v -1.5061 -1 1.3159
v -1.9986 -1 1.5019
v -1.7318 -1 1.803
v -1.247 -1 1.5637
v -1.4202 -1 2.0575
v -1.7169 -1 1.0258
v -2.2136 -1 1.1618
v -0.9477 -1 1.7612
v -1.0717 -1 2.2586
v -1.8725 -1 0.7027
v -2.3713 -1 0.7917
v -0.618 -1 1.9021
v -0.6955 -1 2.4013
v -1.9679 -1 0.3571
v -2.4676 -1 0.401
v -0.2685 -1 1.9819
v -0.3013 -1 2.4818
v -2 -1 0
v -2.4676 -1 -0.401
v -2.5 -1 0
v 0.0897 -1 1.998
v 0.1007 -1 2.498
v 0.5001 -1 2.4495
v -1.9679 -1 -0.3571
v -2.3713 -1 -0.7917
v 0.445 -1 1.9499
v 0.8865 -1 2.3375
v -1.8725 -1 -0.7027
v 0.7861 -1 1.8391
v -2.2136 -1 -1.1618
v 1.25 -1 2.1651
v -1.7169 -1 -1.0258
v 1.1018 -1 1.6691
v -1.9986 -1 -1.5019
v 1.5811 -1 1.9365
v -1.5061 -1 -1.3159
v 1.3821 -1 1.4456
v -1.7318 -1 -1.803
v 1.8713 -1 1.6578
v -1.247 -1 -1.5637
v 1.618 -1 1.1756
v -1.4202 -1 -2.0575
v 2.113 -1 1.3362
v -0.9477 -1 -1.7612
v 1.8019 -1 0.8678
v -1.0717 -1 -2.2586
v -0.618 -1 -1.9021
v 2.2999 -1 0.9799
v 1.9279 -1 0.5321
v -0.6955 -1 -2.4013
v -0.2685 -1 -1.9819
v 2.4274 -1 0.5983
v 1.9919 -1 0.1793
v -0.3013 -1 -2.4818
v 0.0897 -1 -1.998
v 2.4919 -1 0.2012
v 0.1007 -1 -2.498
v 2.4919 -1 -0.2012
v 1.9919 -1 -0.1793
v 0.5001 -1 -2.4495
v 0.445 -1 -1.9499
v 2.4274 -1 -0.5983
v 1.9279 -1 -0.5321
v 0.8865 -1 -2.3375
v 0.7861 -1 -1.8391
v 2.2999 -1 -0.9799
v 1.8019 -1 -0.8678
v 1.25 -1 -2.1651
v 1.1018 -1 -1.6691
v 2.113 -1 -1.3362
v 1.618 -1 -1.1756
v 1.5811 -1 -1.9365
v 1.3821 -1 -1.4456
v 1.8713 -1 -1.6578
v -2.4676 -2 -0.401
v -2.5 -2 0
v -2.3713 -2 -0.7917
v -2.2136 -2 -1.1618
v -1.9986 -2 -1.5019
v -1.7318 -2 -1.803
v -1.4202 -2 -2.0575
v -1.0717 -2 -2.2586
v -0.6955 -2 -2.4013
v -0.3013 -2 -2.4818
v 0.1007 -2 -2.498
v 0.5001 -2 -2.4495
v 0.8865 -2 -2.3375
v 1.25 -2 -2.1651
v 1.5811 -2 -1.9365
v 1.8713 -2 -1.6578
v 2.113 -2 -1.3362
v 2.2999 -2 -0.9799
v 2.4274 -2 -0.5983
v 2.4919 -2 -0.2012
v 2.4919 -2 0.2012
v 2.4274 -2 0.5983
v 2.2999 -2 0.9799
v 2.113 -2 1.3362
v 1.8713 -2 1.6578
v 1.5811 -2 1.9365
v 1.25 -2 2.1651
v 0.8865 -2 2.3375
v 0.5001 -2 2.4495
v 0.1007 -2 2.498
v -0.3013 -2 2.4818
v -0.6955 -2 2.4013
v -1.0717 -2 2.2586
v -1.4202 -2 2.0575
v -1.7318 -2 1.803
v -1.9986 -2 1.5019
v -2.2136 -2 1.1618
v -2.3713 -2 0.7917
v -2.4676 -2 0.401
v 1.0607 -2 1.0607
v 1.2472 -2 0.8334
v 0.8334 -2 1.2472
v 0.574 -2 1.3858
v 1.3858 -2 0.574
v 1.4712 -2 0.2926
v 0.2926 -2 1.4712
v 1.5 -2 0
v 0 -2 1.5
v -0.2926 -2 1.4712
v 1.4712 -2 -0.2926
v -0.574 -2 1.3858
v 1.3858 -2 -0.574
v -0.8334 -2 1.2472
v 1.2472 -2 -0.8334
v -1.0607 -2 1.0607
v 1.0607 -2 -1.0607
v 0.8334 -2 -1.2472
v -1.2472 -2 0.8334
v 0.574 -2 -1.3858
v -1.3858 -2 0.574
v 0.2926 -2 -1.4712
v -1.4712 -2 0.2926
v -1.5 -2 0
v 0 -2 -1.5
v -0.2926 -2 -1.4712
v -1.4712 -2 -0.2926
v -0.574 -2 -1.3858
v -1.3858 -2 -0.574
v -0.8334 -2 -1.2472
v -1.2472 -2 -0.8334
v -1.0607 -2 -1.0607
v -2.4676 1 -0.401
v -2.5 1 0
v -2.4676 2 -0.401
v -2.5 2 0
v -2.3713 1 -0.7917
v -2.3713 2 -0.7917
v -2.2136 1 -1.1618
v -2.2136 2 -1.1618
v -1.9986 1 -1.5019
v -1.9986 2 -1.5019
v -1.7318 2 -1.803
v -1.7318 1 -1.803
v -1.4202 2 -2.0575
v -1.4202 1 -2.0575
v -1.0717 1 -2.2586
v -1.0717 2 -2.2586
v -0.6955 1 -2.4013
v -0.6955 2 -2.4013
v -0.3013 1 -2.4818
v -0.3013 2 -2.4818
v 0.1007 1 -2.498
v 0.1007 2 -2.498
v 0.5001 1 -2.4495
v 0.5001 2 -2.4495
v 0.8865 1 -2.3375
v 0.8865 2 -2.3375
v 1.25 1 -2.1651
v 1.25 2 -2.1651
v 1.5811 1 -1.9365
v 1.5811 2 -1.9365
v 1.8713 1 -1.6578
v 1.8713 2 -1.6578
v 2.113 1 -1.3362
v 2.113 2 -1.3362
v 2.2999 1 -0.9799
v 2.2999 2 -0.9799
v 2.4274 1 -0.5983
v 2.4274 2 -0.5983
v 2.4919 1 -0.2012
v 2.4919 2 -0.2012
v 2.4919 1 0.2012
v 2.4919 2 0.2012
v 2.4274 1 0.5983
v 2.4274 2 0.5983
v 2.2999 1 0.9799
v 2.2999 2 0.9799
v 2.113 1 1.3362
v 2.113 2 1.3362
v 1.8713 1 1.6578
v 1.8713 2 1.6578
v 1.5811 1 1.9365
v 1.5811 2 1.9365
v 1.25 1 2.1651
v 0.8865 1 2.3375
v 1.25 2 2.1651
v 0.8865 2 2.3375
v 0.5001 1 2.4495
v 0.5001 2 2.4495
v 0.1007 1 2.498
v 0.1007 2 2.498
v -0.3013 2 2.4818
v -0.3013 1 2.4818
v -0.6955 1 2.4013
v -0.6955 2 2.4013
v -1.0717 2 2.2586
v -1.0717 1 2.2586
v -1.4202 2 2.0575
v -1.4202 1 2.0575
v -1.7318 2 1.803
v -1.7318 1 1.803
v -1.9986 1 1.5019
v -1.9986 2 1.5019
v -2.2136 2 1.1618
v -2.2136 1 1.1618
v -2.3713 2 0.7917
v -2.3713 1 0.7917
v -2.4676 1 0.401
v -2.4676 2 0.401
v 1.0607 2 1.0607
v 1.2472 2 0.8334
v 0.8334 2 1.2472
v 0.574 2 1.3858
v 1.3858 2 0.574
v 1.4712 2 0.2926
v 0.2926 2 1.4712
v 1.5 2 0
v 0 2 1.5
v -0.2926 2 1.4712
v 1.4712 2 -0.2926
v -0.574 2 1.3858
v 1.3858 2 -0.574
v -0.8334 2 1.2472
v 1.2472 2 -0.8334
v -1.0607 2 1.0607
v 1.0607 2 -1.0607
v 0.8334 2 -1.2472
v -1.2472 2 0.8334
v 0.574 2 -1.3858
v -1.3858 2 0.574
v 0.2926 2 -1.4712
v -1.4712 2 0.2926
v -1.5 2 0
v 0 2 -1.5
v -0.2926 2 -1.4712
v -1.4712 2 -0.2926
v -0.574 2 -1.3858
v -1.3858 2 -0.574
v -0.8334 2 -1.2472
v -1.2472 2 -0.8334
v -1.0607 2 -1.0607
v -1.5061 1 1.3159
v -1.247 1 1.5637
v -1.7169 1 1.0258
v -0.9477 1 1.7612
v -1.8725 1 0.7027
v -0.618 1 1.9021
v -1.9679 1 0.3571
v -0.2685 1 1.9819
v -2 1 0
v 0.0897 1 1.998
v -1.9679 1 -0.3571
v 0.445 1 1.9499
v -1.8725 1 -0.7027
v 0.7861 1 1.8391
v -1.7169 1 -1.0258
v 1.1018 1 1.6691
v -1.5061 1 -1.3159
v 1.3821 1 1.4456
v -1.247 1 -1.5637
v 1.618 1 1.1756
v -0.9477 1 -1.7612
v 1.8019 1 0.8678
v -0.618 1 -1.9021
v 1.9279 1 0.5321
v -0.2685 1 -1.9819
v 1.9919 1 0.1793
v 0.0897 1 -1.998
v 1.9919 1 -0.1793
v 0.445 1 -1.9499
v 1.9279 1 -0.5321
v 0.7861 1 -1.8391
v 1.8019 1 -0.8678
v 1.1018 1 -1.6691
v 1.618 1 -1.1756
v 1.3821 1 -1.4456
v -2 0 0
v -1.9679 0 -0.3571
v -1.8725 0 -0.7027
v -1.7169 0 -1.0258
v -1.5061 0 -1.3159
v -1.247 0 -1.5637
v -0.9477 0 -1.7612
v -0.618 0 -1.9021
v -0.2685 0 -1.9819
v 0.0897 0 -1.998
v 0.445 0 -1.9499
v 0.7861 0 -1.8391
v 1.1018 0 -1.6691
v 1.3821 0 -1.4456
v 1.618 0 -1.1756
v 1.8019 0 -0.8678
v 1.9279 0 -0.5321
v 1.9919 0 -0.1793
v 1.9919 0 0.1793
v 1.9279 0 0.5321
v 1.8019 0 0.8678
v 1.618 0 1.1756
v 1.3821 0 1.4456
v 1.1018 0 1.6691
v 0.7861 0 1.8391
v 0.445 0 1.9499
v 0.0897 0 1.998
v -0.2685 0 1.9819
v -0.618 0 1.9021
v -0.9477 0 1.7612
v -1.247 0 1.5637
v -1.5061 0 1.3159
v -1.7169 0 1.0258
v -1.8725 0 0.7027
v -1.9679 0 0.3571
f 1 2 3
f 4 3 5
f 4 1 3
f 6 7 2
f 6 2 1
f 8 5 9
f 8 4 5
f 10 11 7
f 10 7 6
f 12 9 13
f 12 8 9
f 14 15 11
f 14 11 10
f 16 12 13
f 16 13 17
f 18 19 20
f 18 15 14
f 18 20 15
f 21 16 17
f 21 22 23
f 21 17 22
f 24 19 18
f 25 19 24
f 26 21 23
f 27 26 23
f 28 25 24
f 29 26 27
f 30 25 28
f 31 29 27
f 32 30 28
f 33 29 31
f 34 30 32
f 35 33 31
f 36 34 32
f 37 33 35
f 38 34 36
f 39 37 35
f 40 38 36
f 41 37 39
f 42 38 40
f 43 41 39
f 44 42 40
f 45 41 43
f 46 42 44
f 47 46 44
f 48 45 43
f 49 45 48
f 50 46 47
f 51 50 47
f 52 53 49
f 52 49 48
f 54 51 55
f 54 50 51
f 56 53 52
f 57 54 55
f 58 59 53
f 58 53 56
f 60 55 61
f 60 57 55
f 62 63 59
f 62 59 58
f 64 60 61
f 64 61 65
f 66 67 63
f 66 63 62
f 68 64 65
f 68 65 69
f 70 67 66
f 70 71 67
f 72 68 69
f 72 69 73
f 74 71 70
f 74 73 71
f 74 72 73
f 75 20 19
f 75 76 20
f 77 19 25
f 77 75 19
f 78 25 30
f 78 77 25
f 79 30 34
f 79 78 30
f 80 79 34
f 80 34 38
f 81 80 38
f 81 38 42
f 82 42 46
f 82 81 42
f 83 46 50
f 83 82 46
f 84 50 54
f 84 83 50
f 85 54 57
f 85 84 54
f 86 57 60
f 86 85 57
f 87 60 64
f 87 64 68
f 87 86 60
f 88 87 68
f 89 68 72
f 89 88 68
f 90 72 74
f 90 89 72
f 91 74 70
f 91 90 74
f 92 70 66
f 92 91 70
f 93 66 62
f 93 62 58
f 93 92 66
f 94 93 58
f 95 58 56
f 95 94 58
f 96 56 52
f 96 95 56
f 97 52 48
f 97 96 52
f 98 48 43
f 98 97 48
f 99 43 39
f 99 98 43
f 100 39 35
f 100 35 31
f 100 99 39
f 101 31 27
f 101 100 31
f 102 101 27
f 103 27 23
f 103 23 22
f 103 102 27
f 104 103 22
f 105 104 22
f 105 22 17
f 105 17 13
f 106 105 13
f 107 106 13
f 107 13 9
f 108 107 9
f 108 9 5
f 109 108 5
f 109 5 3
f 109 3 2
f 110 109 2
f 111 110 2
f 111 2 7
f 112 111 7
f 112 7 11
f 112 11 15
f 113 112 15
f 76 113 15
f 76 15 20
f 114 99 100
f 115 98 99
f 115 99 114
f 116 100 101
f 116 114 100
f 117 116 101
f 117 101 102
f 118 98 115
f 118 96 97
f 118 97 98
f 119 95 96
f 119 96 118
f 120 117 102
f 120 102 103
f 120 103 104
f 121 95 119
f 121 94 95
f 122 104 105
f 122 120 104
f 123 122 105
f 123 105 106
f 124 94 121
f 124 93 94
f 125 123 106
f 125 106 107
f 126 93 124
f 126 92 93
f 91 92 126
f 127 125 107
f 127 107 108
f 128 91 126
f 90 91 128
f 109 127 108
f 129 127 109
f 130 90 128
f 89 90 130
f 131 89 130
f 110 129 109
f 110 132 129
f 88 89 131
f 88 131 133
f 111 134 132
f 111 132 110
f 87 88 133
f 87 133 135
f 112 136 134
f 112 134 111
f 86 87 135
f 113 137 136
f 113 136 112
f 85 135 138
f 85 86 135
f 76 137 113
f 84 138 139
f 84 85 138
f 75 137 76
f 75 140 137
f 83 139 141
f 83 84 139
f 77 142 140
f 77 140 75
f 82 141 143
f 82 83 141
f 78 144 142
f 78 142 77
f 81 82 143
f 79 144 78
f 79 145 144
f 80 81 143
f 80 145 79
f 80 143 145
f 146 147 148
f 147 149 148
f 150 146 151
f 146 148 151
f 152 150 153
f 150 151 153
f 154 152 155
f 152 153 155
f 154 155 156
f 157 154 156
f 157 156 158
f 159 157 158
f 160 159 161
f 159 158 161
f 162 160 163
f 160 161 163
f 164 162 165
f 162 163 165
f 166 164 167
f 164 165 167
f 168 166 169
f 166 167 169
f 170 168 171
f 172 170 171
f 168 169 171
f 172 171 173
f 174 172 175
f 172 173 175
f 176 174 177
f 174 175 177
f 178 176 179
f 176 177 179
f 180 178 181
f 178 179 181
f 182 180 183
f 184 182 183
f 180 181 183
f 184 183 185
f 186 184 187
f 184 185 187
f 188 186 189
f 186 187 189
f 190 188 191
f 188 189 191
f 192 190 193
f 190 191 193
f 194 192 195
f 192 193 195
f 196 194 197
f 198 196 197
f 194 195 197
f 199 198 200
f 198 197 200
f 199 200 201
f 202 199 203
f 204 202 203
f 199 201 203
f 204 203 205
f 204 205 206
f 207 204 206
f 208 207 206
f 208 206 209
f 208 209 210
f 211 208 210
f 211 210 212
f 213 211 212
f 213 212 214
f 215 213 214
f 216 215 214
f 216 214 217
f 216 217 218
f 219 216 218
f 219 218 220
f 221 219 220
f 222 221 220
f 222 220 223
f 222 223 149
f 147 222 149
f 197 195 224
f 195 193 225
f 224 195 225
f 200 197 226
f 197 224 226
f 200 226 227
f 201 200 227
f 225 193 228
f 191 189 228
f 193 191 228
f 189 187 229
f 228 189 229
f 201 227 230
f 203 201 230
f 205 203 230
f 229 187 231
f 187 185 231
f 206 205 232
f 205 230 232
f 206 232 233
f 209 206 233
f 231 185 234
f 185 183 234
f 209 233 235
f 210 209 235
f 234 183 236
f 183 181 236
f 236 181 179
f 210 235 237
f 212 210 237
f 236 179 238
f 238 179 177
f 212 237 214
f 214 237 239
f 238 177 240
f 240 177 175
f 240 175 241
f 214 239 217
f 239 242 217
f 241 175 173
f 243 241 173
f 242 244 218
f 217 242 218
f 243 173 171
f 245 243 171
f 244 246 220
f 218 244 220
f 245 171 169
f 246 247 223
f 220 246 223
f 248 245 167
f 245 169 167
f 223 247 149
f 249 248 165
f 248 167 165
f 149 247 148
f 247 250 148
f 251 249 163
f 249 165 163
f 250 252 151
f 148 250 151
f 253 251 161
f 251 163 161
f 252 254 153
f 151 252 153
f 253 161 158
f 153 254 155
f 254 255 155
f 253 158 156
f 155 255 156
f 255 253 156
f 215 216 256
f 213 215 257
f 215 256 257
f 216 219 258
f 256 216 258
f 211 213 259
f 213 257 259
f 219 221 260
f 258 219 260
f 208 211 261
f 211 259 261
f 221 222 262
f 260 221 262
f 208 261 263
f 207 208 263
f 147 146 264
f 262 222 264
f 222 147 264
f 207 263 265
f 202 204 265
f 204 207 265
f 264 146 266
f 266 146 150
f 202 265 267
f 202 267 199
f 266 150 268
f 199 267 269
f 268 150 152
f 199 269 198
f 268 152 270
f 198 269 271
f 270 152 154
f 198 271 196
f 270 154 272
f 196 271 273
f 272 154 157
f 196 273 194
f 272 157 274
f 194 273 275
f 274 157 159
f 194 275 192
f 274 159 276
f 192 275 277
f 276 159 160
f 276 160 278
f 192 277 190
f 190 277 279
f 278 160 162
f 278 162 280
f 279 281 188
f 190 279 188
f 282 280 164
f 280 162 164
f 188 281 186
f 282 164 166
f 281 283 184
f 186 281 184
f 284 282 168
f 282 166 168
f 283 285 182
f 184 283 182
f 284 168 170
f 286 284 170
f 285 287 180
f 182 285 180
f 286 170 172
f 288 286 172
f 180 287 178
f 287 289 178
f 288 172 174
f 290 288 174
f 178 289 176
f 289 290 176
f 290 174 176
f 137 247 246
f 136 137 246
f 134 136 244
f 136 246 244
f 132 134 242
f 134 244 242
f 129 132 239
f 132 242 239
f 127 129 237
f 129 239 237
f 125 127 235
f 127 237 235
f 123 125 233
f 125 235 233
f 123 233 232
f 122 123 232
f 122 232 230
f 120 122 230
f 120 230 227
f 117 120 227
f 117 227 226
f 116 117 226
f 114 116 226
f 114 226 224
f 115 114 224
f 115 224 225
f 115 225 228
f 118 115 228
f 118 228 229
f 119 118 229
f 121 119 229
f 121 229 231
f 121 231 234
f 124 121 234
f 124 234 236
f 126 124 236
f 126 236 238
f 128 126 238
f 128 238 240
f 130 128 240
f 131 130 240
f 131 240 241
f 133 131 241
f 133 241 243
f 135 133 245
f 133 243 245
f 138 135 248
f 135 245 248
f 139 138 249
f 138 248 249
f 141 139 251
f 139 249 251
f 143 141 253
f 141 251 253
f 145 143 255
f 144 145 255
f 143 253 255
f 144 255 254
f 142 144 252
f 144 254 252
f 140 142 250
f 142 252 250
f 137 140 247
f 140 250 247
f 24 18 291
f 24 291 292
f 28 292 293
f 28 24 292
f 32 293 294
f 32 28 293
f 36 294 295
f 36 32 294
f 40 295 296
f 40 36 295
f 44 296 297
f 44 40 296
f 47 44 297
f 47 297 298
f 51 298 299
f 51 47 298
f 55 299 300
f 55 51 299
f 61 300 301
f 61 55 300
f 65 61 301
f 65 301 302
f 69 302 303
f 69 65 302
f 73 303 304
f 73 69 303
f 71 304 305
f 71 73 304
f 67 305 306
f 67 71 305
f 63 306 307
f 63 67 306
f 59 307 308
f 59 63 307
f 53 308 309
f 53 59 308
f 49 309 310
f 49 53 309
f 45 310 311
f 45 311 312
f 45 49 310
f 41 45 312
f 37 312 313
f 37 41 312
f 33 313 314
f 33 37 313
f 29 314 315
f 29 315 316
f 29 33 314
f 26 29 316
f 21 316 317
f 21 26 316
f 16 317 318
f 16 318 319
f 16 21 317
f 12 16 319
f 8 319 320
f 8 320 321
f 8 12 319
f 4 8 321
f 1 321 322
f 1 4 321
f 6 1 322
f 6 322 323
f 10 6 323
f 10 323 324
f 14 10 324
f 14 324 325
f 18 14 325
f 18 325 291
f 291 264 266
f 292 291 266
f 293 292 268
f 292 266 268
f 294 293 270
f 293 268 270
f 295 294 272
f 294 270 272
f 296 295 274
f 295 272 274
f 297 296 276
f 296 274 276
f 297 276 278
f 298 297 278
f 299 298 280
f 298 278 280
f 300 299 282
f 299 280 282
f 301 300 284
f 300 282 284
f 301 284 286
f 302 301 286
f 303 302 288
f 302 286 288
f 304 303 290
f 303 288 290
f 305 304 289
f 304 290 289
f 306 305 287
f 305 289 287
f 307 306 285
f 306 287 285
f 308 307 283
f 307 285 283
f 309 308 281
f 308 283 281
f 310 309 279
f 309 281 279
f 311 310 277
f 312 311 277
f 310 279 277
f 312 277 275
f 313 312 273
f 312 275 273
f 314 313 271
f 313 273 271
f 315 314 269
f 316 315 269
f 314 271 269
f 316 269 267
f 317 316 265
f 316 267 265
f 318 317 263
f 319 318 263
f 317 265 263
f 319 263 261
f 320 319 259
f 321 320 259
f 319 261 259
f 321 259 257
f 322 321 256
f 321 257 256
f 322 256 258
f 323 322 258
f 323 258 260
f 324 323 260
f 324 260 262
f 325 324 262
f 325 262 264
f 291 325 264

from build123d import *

# Parameters (mm, degrees)
SKETCH2_R          = 1.5
CUT_EXTRUDE1_DEPTH = 6.338539126


with BuildPart() as part:
    # Sketch1 → Revolve1 (revolve)
    with BuildSketch(Plane.XY):
        Polygon((0, 2), (0, 0), (-2, 0), (-2, 1), (-2.5, 1), (-2.5, 2), align=None)
    revolve1 = revolve(axis=Axis((0, 2, 0), (0, -1, 0)))

    # Mirror1: Revolve1 across plane
    add(revolve1.mirror(Plane(origin=(-2, 0, 0), x_dir=(0, 0, 1), z_dir=(0, -1, 0))))

    # Sketch2 → Cut-Extrude1 (cut, through all)
    with BuildSketch(Plane(origin=(0, 2, 0), x_dir=(1, 0, 0), z_dir=(0, 1, 0))):
        with Locations(Location((0, 0, 0), (0, 0, 180))):
            Circle(SKETCH2_R)
    extrude(amount=-CUT_EXTRUDE1_DEPTH, mode=Mode.SUBTRACT)


solid = part.part
